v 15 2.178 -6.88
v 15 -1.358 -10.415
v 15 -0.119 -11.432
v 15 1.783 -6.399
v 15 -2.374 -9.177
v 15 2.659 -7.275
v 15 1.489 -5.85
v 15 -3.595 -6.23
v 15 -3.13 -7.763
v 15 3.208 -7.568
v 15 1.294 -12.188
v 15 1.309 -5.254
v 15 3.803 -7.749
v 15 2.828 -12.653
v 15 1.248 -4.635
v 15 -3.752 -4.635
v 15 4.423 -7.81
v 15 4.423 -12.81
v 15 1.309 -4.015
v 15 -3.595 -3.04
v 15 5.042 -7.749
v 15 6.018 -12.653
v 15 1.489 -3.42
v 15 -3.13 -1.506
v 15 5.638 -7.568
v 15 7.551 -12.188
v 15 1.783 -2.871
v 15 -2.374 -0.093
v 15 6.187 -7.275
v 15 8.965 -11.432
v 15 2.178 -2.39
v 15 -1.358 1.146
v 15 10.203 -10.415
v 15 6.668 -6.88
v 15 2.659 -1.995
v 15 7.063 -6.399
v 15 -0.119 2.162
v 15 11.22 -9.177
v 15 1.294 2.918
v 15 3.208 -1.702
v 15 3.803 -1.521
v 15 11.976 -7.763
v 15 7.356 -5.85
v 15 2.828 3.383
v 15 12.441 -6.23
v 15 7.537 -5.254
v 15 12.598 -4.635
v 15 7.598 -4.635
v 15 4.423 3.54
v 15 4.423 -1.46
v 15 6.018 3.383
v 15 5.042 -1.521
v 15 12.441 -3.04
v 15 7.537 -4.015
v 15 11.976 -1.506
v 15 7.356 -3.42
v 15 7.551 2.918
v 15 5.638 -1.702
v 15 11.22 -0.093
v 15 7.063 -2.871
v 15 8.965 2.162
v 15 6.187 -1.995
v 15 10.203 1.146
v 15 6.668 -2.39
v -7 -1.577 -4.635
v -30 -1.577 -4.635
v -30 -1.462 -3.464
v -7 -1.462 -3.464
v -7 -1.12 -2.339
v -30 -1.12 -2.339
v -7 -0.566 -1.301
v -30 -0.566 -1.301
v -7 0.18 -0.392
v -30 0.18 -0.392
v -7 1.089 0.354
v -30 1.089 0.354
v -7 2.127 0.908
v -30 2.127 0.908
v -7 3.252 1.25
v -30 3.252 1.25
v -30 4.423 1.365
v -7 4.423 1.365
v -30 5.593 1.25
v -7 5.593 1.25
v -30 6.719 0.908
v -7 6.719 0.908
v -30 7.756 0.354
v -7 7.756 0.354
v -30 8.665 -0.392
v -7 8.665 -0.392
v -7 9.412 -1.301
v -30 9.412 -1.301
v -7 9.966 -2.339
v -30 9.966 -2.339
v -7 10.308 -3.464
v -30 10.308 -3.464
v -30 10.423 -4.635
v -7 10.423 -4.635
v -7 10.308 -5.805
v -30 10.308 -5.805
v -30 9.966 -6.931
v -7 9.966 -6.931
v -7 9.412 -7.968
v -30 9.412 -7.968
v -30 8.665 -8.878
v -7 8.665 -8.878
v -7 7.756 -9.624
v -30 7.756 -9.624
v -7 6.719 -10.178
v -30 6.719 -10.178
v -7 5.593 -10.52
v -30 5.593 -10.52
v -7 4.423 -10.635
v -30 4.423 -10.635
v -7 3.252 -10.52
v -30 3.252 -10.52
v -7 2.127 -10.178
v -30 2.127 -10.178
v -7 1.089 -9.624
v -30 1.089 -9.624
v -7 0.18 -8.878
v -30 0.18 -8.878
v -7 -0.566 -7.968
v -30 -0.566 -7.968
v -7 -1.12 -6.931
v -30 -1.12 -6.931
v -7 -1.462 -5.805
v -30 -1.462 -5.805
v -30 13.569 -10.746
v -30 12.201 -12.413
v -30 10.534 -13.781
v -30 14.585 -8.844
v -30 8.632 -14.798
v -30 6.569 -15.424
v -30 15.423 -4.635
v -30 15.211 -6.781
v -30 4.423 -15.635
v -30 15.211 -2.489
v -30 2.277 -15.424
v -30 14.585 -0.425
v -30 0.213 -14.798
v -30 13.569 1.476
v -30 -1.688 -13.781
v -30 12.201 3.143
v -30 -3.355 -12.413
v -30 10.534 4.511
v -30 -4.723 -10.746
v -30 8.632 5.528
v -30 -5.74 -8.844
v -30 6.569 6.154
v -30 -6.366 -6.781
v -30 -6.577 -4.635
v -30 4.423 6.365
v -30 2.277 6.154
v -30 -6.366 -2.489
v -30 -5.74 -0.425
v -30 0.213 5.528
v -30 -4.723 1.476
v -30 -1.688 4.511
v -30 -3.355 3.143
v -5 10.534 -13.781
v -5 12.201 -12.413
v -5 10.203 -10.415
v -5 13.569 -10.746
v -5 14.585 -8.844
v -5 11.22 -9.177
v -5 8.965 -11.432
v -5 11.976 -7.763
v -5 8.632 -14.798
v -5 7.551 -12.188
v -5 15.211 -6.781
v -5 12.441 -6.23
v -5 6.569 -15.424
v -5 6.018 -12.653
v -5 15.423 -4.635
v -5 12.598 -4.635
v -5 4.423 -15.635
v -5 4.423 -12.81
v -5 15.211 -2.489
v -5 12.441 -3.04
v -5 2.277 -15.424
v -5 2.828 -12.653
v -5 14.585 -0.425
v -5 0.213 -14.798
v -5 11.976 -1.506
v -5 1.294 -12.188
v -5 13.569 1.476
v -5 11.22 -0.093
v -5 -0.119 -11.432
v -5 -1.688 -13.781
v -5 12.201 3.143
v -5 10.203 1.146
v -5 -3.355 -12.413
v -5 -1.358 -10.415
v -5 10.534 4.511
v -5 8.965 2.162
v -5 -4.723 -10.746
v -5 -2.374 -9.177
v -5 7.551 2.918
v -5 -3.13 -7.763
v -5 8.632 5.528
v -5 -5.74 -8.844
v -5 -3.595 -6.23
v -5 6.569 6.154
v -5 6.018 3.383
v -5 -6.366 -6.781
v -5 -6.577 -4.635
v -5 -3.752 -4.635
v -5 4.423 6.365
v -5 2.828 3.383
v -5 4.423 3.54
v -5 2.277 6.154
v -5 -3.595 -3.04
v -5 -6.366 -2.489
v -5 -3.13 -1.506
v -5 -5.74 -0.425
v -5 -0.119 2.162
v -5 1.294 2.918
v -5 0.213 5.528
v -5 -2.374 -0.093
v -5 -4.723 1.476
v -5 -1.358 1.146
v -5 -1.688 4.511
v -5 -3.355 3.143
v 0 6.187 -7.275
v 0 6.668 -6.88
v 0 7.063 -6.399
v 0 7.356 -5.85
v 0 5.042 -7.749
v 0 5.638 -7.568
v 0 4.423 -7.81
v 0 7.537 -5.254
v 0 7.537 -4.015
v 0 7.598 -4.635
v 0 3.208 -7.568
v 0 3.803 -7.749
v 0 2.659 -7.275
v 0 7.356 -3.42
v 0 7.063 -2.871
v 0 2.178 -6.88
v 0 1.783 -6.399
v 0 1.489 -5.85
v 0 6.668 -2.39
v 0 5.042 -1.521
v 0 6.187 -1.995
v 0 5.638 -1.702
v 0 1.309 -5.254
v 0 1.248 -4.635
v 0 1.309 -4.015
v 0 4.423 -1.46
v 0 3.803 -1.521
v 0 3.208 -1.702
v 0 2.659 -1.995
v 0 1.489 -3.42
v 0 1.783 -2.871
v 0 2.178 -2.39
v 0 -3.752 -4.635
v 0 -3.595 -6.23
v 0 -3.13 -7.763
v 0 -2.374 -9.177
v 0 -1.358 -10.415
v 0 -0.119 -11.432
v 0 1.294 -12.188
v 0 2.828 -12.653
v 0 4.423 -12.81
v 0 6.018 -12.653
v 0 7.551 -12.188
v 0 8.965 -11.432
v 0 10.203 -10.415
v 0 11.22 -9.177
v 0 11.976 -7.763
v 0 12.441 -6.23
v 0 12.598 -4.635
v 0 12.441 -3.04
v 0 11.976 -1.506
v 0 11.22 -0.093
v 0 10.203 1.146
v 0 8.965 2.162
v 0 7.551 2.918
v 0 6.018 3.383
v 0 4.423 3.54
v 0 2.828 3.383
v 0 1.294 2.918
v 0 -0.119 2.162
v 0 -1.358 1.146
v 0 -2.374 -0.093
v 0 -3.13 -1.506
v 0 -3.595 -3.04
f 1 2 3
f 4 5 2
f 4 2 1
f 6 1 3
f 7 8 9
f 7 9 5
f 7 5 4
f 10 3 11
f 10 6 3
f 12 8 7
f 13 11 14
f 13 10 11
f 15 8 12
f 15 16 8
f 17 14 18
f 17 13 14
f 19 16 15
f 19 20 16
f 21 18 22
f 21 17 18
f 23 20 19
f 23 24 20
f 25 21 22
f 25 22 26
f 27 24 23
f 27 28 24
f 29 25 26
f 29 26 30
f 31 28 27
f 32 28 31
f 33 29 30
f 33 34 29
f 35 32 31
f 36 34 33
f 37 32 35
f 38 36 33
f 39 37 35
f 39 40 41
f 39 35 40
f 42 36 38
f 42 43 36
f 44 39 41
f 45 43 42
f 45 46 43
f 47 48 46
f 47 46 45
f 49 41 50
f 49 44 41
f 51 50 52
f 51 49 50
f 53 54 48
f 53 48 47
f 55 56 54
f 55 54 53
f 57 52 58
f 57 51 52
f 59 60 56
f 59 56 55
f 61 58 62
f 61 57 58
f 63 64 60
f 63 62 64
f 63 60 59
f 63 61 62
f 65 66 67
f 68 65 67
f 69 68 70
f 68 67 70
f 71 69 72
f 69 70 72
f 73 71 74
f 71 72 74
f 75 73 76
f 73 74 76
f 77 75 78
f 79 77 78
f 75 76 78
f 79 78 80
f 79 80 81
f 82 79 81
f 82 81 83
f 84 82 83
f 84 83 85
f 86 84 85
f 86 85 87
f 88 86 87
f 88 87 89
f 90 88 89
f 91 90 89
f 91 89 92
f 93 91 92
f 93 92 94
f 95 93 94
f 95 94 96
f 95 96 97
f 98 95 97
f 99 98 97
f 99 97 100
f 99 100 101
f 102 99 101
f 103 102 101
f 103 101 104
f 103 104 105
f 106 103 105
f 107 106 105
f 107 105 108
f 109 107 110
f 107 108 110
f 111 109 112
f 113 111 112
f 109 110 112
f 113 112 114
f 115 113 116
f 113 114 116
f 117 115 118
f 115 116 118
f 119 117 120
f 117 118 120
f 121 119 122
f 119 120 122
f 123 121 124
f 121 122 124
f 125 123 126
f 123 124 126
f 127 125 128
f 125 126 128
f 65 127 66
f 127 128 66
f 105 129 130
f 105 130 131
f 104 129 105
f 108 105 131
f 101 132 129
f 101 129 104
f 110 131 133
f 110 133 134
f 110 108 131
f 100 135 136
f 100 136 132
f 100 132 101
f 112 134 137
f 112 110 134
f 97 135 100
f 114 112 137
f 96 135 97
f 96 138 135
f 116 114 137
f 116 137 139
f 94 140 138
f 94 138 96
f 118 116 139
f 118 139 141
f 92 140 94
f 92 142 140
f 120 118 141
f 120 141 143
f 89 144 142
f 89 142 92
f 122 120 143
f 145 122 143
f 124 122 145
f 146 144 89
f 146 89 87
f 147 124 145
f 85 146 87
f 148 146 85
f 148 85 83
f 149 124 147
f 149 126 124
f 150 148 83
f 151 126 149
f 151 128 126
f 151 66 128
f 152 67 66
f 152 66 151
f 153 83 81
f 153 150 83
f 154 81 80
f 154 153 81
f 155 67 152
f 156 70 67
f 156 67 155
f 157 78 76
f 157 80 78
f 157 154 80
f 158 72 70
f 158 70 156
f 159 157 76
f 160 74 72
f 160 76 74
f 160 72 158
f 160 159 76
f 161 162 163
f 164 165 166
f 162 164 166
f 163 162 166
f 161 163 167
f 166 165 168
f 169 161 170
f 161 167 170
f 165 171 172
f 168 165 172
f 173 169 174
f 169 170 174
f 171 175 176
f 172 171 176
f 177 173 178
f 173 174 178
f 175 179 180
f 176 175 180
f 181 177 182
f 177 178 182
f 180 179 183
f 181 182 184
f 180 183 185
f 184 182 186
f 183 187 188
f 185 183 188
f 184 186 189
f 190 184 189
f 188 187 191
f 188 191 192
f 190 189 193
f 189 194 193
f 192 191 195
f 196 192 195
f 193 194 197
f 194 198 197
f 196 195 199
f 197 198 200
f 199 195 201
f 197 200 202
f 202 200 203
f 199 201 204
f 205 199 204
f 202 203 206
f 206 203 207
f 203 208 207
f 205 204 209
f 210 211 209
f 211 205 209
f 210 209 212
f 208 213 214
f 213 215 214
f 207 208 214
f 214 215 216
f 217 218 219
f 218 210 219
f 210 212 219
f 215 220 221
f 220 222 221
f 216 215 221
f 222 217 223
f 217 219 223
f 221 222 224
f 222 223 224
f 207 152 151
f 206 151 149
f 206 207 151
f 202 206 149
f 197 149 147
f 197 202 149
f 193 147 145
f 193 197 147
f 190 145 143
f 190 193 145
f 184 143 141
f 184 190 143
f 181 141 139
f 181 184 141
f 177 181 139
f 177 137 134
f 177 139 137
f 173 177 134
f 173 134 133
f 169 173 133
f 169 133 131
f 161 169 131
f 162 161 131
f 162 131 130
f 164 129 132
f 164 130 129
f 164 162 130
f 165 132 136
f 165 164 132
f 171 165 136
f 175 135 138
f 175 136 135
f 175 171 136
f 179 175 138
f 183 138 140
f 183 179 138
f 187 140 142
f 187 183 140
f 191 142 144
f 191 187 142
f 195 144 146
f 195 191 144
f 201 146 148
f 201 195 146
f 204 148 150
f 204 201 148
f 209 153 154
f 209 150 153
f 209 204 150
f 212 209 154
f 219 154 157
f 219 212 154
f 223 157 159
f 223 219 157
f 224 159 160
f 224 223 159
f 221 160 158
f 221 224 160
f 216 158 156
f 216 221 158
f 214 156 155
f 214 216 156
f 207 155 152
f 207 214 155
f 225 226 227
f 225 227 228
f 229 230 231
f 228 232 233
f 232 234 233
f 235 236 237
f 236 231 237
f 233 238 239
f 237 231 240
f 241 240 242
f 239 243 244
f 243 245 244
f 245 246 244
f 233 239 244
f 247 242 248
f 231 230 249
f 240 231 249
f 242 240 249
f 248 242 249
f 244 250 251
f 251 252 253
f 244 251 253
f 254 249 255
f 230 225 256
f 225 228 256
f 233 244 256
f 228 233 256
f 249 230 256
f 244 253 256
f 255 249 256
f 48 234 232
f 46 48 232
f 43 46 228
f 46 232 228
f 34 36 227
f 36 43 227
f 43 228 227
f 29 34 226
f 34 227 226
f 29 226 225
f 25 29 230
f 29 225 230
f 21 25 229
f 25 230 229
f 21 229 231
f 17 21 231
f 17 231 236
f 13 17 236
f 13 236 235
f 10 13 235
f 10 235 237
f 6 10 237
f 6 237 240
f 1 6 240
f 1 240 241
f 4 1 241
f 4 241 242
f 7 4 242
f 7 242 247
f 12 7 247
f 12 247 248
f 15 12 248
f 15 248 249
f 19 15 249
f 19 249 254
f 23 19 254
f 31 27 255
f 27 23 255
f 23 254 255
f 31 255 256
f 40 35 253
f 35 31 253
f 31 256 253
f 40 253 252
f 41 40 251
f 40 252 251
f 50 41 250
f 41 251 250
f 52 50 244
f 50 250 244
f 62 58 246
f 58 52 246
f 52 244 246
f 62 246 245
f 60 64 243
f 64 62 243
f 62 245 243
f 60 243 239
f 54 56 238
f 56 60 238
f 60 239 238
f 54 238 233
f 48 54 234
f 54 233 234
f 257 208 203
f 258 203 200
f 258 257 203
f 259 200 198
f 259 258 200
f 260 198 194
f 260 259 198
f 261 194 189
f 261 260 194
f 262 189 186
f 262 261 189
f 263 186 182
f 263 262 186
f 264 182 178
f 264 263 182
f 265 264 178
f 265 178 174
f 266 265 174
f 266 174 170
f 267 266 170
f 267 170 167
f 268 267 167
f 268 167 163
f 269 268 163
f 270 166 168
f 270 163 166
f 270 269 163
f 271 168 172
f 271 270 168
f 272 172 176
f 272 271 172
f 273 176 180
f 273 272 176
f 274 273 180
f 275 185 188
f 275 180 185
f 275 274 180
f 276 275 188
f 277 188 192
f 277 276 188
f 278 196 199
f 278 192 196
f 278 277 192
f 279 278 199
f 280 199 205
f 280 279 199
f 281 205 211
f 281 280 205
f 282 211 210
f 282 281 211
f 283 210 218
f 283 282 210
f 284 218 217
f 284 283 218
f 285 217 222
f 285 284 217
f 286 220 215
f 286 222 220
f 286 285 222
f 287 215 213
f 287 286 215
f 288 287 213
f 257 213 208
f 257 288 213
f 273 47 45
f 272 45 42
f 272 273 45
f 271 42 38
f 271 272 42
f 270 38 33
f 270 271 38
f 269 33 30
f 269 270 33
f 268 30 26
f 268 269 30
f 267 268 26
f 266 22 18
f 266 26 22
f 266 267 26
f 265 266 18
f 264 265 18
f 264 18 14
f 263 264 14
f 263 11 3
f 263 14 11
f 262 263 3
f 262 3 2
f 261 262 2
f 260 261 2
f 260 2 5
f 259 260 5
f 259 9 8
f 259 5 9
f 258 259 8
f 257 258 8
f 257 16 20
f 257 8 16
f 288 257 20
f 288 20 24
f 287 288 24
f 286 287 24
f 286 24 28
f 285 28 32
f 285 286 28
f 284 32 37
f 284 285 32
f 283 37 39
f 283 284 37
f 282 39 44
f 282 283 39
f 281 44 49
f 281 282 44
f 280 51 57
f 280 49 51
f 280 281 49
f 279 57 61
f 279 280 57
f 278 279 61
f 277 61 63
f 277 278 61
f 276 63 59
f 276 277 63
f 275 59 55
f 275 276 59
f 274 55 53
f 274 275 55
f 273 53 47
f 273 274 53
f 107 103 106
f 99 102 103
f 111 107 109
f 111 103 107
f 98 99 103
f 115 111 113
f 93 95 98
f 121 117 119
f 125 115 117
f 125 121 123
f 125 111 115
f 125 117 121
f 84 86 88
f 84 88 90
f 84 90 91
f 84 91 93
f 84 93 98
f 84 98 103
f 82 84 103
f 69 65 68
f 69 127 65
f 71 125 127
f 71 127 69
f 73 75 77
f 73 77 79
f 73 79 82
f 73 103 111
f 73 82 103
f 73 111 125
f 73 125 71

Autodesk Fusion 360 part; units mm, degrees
sketch "Boceto1" plane through (0, 0, 0) normal (1, 0, 0) x (0, 1, 0)
  circle A0 centre (4.4228, -4.6349) radius 3.175
  circle A1 centre (4.4228, -4.6349) radius 8.175
  dimension "d1" = 6.35
  dimension "d2" = 5
extrude "Extruir1" add sketch "Boceto1" along normal blind 15
sketch "Boceto2" plane through (0, 0, 0) normal (-1, 0, 0) x (0, -1, 0)
  circle A0 centre (-4.4228, -4.6349) radius 3.175
  circle A1 centre (-4.4228, -4.6349) radius 8.175
  circle A2 centre (-4.4228, -4.6349) radius 8.175
extrude "Extruir2" add sketch "Boceto2" along normal blind 5 contours A0 | A1 A2
sketch "Boceto3" plane through (-5, 0, 0) normal (-1, 0, 0) x (0, -1, 0)
  circle A0 centre (-4.4228, -4.6349) radius 8.175
  circle A1 centre (-4.4228, -4.6349) radius 11
  dimension "d7" = 22
extrude "Extruir3" add sketch "Boceto3" along normal blind 25 contours A0 | A1
sketch "Boceto4" plane through (-30, 0, 0) normal (-1, 0, 0) x (0, -1, 0)
  circle A0 centre (-4.4228, -4.6349) radius 11
  circle A1 centre (-4.4228, -4.6349) radius 6
  dimension "d10" = 12
extrude "Extruir4" cut sketch "Boceto4" against normal blind 23 contours A1
